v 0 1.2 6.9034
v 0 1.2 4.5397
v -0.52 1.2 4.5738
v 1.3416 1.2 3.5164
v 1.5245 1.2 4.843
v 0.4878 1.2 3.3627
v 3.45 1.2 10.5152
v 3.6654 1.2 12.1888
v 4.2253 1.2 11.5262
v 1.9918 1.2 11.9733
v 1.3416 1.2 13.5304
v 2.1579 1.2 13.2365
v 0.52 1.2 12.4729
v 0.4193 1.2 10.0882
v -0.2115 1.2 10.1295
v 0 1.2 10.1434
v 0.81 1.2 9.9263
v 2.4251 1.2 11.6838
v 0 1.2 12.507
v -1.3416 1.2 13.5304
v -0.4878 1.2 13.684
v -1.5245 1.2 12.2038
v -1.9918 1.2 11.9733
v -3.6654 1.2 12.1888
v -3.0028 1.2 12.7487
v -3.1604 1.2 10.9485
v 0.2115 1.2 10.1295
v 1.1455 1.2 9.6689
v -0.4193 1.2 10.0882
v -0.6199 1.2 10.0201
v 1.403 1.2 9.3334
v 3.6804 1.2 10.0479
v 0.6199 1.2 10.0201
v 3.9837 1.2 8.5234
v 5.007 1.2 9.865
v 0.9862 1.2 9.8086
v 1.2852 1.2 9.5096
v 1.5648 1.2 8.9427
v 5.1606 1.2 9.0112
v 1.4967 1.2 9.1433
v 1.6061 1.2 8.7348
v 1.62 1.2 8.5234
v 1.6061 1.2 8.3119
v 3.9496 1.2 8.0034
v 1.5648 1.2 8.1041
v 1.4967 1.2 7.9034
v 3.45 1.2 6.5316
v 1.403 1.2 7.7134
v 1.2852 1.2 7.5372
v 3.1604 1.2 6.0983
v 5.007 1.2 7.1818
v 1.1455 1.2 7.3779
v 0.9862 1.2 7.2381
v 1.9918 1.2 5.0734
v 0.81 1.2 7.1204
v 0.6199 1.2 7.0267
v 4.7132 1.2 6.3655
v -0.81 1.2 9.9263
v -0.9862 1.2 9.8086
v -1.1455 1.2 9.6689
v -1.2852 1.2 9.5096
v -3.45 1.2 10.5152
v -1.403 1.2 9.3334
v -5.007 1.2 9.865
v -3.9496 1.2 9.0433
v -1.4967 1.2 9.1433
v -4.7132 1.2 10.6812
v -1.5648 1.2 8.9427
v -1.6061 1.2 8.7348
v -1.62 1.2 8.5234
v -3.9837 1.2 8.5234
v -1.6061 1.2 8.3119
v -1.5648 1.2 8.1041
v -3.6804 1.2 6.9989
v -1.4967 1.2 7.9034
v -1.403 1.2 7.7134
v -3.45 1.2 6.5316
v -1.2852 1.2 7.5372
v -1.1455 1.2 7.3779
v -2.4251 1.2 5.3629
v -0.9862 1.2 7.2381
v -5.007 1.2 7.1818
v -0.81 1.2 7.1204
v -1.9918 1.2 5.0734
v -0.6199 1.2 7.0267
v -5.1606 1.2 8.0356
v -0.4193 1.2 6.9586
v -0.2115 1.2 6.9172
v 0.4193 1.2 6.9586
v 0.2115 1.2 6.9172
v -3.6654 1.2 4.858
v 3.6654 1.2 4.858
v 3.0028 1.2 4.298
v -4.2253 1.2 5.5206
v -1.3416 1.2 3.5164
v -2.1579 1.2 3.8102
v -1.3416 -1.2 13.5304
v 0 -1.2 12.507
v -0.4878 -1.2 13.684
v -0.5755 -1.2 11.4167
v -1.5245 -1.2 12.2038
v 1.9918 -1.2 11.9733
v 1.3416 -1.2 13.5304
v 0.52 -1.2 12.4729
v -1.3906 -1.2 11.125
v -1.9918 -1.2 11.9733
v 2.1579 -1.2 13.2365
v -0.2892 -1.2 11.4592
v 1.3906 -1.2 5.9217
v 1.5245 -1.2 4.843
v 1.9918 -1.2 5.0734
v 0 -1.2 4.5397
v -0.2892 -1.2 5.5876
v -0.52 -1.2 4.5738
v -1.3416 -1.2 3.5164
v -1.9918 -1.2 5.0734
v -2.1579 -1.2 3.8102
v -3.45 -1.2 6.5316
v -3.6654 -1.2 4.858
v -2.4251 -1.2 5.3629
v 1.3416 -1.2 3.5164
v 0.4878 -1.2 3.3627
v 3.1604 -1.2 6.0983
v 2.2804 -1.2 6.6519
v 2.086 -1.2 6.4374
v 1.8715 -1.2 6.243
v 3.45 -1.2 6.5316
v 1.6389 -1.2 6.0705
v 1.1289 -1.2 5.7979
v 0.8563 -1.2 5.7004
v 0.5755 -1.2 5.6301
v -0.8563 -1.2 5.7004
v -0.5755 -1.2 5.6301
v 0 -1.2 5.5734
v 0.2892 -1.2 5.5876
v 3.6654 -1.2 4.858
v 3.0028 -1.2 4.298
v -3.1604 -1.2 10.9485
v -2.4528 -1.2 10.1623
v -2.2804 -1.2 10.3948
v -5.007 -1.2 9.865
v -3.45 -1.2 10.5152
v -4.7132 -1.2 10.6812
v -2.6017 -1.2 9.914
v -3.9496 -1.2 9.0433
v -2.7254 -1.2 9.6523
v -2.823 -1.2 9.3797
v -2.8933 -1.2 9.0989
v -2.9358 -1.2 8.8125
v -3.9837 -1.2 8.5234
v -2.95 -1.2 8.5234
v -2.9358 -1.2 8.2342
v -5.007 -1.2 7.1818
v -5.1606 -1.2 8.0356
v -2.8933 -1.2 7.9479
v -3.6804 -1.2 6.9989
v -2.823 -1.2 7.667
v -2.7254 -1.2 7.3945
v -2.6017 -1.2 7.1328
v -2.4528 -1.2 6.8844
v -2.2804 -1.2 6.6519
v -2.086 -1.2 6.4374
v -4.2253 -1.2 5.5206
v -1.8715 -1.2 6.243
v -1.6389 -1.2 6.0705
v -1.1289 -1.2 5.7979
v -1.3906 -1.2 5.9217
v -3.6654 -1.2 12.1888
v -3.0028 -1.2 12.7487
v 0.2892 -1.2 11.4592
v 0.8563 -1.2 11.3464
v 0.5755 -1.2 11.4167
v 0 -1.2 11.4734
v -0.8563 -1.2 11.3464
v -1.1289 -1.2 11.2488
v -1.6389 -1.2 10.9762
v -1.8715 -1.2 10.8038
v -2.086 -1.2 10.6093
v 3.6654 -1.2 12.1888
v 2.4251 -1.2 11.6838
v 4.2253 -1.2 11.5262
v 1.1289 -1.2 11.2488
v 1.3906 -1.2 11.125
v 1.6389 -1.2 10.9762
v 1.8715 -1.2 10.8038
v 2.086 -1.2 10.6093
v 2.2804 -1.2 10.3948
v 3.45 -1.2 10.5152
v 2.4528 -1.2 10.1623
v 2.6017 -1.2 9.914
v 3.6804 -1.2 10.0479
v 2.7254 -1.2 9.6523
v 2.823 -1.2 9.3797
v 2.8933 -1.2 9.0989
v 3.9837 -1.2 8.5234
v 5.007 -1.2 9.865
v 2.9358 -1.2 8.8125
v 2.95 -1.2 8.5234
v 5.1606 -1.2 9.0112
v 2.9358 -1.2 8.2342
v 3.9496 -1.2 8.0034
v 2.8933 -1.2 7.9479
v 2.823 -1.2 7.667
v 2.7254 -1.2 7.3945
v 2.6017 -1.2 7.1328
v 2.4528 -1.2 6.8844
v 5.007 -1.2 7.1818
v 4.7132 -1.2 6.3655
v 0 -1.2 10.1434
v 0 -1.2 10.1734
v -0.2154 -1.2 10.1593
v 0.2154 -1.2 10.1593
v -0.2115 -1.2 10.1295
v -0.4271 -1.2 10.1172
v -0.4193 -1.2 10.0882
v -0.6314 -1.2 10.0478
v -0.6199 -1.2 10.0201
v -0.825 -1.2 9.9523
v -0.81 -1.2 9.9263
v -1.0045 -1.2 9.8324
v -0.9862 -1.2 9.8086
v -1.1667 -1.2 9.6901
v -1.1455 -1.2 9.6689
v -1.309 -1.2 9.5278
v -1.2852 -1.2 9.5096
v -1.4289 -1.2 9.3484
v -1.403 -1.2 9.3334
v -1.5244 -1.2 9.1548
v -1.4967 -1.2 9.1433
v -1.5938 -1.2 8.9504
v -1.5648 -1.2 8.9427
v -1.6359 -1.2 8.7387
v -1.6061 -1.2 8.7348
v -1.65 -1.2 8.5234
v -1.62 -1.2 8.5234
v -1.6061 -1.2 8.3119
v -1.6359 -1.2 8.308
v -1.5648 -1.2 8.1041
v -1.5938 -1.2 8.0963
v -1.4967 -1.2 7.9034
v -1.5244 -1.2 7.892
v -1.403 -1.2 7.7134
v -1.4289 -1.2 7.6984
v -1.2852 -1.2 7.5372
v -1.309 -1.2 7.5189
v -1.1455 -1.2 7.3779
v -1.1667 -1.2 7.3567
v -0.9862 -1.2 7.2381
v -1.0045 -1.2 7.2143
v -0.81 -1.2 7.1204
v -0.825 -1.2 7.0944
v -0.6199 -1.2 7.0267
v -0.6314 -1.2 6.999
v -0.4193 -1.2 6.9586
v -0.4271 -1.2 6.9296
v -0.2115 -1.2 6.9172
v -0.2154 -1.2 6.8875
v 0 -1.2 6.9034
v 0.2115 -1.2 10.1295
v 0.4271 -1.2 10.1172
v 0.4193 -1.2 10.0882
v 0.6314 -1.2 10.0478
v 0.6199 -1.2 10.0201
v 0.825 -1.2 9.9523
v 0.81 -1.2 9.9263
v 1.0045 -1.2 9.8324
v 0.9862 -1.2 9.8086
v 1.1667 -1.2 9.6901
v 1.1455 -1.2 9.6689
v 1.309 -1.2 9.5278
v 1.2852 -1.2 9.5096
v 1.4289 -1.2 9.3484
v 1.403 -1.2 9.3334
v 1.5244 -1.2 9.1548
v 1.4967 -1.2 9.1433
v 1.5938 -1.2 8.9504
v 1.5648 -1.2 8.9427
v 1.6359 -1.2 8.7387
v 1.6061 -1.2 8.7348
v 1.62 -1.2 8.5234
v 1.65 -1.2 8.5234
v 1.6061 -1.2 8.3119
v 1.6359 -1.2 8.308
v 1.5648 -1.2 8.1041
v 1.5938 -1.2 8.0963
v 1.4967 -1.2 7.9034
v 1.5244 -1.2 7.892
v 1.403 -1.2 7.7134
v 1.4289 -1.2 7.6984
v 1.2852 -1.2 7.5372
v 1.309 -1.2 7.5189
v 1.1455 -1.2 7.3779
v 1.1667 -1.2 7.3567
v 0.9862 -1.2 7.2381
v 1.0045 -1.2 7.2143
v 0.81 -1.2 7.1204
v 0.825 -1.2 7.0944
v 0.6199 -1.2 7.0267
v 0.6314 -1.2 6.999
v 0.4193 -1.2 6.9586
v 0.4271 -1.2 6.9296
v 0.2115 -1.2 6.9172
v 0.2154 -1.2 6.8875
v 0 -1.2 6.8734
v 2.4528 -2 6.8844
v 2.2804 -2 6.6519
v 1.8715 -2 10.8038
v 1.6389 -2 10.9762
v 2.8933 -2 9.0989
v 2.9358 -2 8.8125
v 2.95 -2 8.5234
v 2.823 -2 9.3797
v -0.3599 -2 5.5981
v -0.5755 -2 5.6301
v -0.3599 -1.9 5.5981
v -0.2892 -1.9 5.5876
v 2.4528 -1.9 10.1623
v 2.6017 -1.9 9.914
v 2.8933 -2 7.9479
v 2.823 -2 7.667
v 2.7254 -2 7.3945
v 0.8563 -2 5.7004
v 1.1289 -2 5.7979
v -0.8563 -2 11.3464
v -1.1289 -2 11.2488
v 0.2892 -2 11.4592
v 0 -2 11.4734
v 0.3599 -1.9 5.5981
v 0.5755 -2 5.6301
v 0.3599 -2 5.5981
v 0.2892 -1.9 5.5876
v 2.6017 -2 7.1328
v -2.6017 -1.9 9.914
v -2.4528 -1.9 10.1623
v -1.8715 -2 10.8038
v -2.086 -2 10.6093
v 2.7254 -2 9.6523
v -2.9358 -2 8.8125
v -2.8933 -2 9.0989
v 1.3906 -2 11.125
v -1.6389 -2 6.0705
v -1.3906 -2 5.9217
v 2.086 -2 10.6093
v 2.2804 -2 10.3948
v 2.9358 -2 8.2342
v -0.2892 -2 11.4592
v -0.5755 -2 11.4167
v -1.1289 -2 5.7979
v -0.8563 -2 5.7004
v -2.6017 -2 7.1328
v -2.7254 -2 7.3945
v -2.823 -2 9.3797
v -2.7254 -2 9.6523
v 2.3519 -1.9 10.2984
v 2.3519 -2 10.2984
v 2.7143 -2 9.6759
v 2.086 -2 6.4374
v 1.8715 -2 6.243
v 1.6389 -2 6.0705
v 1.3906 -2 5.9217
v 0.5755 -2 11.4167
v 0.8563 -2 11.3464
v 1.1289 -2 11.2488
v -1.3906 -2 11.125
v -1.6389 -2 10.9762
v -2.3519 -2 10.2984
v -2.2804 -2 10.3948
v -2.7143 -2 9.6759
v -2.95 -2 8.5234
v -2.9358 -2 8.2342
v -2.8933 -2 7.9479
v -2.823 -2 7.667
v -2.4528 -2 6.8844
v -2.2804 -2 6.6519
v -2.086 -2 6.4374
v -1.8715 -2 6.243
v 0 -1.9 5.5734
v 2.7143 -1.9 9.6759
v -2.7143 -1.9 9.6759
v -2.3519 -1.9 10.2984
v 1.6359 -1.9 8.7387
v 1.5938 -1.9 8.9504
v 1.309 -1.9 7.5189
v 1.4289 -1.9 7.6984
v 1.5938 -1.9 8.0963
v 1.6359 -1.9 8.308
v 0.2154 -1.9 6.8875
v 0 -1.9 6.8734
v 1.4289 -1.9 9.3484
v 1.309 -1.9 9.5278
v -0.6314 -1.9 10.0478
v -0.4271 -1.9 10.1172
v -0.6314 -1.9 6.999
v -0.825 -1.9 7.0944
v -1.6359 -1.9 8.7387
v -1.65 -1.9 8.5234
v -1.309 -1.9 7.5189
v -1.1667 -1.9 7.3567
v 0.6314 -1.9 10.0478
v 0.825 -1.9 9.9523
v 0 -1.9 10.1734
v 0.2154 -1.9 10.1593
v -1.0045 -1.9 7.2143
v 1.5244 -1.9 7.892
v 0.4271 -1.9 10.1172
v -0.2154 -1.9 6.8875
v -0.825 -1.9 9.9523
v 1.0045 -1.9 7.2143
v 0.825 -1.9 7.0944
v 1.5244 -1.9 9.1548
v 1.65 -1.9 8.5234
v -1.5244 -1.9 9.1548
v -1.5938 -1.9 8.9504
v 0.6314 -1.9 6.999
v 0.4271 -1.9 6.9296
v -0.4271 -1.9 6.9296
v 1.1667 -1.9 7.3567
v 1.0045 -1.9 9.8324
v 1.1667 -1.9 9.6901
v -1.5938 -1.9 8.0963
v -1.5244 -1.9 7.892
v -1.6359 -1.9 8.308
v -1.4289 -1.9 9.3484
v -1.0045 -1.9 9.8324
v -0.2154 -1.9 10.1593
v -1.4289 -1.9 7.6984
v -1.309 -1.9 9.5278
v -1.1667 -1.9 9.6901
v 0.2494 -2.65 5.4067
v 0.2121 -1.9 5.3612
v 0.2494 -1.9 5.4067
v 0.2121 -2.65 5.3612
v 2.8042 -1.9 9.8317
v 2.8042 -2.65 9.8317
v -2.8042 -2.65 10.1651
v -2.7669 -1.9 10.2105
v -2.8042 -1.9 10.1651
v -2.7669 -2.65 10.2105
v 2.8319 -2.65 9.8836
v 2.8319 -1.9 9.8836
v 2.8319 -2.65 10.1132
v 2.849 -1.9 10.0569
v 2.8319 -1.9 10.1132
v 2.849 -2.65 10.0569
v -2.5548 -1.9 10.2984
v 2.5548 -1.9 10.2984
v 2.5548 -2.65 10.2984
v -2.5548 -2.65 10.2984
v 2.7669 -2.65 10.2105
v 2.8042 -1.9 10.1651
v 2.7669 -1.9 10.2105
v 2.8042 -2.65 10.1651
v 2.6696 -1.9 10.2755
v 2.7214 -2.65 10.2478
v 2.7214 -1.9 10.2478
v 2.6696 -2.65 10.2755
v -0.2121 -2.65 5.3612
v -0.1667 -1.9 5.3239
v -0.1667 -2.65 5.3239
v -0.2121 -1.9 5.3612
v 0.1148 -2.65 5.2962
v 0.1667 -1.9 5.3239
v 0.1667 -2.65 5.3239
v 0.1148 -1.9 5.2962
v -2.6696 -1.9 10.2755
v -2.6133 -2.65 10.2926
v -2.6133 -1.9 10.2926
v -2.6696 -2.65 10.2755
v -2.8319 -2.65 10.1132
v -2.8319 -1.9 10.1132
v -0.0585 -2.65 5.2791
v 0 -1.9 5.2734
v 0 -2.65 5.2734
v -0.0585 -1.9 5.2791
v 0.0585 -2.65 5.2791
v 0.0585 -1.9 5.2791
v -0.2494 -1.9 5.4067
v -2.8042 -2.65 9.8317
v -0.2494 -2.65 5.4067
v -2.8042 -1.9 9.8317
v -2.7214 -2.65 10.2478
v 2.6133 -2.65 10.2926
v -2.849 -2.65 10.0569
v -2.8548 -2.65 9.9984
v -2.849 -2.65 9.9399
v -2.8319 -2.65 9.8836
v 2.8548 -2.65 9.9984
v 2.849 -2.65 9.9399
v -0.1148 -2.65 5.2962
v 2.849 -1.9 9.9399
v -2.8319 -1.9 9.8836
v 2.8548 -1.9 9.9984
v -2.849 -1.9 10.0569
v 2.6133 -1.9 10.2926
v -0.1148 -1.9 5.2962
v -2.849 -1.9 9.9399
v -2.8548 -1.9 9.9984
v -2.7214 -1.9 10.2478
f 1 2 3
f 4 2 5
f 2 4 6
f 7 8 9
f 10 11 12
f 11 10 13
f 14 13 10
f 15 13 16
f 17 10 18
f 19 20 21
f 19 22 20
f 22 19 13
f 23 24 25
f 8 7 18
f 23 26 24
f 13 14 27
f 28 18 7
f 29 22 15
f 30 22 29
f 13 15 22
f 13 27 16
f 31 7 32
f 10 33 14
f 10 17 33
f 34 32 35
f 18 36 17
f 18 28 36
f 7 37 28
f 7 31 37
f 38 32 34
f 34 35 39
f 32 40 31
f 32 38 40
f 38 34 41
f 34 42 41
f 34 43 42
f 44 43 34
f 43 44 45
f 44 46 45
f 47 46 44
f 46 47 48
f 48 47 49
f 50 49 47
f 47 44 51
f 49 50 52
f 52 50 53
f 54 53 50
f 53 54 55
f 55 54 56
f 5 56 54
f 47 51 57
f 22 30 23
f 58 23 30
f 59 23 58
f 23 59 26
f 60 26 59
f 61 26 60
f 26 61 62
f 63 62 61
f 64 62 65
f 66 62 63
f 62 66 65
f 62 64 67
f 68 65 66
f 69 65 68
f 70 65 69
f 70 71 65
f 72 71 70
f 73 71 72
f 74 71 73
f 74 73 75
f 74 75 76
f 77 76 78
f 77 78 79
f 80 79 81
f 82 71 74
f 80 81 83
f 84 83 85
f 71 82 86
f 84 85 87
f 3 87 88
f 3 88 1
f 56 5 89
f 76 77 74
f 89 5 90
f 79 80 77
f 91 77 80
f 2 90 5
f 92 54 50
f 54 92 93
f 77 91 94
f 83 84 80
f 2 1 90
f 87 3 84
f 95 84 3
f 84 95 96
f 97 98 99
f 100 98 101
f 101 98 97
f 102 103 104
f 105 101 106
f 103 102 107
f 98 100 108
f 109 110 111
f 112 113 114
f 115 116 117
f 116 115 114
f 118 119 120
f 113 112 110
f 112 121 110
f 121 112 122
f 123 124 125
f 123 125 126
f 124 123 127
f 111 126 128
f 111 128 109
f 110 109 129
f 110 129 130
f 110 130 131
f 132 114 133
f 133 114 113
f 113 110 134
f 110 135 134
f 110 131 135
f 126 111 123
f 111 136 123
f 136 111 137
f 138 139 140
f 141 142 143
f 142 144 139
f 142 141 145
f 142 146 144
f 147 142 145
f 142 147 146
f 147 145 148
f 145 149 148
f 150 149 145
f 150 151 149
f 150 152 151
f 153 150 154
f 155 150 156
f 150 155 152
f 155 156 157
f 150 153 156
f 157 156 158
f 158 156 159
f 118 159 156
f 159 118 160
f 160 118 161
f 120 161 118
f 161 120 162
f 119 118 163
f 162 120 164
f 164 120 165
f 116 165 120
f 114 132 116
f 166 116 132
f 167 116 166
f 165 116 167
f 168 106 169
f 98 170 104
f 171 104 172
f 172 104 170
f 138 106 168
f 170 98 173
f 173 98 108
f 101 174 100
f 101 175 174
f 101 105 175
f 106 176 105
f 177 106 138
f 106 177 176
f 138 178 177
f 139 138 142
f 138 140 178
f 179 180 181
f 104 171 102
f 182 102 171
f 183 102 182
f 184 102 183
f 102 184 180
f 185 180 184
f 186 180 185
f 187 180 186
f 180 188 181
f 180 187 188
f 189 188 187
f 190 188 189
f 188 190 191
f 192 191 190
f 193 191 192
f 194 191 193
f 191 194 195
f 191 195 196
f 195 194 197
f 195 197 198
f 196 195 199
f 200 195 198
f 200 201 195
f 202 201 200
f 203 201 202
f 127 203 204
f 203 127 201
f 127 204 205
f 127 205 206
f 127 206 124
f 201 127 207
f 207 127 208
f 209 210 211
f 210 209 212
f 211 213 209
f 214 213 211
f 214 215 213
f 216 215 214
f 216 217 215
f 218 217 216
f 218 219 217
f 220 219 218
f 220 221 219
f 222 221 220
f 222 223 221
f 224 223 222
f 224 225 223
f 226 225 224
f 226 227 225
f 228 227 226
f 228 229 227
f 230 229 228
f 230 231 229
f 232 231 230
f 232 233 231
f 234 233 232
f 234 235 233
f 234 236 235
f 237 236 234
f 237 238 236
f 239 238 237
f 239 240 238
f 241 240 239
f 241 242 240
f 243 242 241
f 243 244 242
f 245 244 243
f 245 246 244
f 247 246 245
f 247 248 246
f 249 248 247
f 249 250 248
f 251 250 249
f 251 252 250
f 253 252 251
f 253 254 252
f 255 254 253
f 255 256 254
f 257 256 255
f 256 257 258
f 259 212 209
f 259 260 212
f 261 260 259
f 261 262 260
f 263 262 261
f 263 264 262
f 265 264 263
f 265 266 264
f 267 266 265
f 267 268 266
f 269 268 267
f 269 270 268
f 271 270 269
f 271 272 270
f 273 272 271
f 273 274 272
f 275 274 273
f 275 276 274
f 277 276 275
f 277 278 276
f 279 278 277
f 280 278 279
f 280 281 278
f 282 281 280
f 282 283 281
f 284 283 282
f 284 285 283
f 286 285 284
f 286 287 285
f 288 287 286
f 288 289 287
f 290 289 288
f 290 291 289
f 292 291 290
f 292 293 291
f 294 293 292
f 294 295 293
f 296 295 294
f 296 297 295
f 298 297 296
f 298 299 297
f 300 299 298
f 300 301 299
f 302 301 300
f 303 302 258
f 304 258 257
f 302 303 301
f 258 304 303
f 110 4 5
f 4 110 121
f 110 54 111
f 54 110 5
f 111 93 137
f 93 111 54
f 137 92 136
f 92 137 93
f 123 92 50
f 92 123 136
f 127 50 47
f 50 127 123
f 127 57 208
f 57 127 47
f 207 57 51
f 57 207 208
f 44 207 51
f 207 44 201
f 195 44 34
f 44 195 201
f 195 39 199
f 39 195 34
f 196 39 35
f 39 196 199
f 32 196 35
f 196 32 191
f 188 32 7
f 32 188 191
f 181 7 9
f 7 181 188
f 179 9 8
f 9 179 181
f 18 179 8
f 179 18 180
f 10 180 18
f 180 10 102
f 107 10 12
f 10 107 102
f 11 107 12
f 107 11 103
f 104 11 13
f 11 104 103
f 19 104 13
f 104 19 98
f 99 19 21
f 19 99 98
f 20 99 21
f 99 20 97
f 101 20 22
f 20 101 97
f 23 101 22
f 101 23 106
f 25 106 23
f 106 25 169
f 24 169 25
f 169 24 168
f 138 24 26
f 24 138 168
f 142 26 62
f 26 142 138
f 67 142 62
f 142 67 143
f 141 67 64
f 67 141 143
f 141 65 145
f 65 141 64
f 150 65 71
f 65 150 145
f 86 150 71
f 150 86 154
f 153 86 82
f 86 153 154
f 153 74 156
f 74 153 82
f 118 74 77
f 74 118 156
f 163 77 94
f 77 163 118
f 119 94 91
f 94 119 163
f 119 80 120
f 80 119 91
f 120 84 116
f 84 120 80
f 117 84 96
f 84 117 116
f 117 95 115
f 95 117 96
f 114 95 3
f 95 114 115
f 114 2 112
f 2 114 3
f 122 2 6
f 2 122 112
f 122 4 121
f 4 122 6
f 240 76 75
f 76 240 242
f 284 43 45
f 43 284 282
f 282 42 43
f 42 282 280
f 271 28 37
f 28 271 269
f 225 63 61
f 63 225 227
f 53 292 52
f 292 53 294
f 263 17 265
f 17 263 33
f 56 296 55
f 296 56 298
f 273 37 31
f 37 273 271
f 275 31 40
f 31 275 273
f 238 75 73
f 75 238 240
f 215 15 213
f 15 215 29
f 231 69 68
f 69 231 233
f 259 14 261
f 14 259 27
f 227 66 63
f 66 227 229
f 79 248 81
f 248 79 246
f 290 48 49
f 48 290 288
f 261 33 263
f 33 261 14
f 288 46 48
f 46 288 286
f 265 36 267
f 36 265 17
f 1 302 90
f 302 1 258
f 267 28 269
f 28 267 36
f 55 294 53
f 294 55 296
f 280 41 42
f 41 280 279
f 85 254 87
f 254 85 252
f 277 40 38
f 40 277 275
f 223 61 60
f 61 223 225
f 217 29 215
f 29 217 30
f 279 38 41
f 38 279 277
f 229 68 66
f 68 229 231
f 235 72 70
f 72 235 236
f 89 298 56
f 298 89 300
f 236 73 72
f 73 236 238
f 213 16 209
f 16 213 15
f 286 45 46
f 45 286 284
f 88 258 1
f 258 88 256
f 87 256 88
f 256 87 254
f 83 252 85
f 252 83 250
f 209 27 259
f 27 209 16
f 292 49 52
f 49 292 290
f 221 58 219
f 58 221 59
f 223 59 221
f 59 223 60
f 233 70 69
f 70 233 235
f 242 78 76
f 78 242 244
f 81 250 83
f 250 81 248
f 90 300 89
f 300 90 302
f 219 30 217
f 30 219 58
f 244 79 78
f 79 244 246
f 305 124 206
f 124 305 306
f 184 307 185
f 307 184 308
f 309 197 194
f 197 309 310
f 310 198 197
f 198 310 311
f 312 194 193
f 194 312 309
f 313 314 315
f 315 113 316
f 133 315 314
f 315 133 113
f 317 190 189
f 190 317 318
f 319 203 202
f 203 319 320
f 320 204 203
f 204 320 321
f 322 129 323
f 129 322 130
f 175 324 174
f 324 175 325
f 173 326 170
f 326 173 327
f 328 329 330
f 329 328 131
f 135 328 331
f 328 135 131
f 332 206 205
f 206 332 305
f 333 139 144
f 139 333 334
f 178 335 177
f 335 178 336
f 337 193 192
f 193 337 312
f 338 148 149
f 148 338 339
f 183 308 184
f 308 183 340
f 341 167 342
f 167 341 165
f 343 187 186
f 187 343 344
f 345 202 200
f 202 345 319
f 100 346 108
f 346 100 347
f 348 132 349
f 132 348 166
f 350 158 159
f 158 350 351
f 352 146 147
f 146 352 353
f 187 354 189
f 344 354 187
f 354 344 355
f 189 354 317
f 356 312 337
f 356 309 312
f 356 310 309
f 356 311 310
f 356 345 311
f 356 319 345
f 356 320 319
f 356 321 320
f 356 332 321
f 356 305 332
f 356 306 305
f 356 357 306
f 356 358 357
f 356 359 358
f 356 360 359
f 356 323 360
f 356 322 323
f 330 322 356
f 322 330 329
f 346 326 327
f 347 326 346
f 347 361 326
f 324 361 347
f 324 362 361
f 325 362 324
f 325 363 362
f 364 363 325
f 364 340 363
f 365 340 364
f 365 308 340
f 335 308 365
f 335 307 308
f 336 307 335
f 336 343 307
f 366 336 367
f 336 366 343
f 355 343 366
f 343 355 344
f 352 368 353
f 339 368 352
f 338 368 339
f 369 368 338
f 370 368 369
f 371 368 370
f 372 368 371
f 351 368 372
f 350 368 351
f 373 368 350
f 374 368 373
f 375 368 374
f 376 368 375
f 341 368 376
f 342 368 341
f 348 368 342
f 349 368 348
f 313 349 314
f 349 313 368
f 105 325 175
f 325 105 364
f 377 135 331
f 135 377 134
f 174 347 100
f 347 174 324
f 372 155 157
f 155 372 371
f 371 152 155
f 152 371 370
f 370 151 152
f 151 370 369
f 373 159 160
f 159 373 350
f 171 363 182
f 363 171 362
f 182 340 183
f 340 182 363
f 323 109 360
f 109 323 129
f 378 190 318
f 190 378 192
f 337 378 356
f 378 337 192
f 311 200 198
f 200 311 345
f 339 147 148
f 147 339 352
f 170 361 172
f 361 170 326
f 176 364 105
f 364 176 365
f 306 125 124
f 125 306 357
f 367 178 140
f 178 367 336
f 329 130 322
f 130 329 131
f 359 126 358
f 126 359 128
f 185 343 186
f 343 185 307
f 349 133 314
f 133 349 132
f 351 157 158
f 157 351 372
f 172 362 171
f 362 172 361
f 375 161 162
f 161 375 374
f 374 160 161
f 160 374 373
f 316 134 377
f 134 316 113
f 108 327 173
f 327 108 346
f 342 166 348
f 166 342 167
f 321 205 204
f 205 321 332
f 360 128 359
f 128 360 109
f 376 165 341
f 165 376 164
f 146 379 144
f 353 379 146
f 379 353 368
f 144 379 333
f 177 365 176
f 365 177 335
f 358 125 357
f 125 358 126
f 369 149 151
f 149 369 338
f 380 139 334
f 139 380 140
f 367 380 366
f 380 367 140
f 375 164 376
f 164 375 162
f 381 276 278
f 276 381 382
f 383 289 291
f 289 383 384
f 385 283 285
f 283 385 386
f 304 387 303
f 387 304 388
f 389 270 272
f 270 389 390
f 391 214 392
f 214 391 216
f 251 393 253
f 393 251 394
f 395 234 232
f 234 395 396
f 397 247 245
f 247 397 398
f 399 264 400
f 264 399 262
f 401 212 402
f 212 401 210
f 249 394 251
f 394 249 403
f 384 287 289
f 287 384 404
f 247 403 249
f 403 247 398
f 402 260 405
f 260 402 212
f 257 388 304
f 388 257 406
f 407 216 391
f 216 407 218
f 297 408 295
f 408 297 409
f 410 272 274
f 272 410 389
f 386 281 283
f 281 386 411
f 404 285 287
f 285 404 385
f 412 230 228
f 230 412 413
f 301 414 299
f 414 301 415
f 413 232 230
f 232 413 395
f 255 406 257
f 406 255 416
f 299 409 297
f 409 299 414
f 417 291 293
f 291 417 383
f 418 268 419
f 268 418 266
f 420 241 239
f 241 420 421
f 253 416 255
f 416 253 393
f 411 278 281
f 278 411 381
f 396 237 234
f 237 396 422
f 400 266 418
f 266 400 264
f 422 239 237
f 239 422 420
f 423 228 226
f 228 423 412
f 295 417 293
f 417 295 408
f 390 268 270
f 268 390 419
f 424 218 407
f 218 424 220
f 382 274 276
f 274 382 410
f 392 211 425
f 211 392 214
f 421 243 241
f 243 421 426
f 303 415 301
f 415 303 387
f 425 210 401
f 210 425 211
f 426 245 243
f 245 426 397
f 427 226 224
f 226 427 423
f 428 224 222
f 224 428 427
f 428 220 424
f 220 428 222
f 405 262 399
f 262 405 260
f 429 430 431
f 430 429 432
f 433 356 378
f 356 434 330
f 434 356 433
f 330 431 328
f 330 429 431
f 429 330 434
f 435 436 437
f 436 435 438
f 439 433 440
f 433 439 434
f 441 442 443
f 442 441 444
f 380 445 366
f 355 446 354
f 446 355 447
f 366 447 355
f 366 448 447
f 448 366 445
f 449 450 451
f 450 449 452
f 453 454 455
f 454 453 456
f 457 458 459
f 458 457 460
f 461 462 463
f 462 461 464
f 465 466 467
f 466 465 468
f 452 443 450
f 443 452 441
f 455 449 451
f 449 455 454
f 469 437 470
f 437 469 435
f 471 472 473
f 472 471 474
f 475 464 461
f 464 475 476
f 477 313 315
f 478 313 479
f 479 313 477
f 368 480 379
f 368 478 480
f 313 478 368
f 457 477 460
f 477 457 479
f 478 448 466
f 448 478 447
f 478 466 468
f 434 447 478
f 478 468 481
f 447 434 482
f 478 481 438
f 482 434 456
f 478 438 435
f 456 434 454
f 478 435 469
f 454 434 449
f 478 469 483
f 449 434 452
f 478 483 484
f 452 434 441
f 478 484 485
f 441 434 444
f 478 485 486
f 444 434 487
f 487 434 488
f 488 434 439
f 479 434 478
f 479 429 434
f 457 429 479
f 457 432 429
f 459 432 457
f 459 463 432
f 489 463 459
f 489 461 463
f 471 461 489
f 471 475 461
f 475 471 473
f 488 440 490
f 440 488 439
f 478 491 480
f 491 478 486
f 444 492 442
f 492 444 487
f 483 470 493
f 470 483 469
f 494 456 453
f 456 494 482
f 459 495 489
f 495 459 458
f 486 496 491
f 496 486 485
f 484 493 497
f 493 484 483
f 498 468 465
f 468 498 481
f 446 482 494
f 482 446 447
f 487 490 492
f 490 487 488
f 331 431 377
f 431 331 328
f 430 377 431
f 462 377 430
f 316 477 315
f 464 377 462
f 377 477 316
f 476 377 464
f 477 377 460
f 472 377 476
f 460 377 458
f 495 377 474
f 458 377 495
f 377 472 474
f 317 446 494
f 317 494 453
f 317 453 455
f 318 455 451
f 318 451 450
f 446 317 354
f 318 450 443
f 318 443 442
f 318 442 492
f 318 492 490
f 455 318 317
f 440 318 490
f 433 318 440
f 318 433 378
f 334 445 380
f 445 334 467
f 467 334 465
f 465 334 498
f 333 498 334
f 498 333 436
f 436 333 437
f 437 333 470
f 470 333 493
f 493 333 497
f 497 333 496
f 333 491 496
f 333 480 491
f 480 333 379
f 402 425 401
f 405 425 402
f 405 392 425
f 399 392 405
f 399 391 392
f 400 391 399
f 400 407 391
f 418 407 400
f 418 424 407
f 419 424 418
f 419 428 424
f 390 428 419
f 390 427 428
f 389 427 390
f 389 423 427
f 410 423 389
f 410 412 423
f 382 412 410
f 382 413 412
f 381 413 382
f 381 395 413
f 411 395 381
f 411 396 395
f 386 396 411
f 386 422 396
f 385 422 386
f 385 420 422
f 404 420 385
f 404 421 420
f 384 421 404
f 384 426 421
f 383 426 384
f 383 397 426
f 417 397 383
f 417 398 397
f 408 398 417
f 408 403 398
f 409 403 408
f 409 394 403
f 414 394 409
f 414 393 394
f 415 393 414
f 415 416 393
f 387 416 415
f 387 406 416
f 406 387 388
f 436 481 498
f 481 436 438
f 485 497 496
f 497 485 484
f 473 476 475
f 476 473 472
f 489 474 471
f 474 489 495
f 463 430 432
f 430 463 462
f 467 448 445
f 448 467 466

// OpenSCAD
// CH1 03C 花键轴 Z+ 侧小齿轮 + Y− 侧狗牙
//
// Mechanical contract
// process: FDM fit prototype; PLA/PETG first article, resin only for fit checks
// material: printed compound candidate; no metal load rating is assumed
// parting_plane: n/a (single annular compound part)
// opening_direction: n/a
// fastener: a nominal Ø3 mm round shaft passes through the Y-axis gear/dog bore
// seal: n/a
// print_orientation: lay the Y axis down only after slicer review; the thumbnail
//   keeps the real assembly direction visible instead of baking in a print pose
// units: mm
// axis: gear and dog are both coaxial with world Y; profile is in world XZ
// placement: gear center is on the Z+ side of the long spline shaft
//
// This file models the literal arrangement: a small gear at Z+ and a rounded-
// triangle dog interface protruding directly below it along Y−.

//#region 导入/依赖
include <parts/ch1_03c_spline_gear_dog_params.scad>
//#endregion

//#region 常量/配置
$fa = 5;
$fs = 0.18;
//#endregion

//#region 模型/类型
// solid     printable gear + lower rounded-triangle dog interface
// thumbnail same part plus the matching lower receiver and a short translucent
// spline-shaft context at Z=0
//#endregion

//#region 私有成员：轮廓与轴向拉伸
module spline_profile_2d(teeth, root_r, tip_r) {
    polygon(spline_gear_points(teeth, root_r, tip_r));
}

module y_profile_extrude(points, center_x, center_y, center_z, thickness) {
    // Local +Z maps to world −Y; the translated interval is centered at center_y.
    translate([center_x, center_y + thickness / 2, center_z])
        rotate([90, 0, 0])
            linear_extrude(
                height = thickness,
                convexity = 8
            )
                polygon(points);
}

module y_bore(center_x, center_y, center_z, diameter, thickness) {
    // Local +Z maps to world +Y, starting just below the lower face.
    translate([
        center_x,
        center_y - thickness / 2 - SPLINE_GEAR_EPS,
        center_z
    ])
        rotate([-90, 0, 0])
            cylinder(
                d = diameter,
                h = thickness + 2 * SPLINE_GEAR_EPS,
                $fn = 48
            );
}

module y_cylinder_at(center_x, center_z, center_y, radius, height, sides = 32) {
    // A Y-axis cylinder whose center is at center_y; its +Z local direction
    // points toward world Y− so the interface grows downward from the base.
    translate([center_x, center_y + height / 2, center_z])
        rotate([90, 0, 0])
            cylinder(r = radius, h = height, $fn = sides);
}

module rounded_triangle_prism(center_y, height, extra_radius = 0) {
    // Convex hull of three round-ended lobes: a printable rounded triangle.
    hull() {
        for (i = [0:2]) {
            angle = SPLINE_DOG_TRI_ROTATION_DEG + i * 120;
            y_cylinder_at(
                SPLINE_GEAR_CENTER_X
                    + SPLINE_DOG_TRI_VERTEX_R * cos(angle),
                SPLINE_GEAR_CENTER_Z
                    + SPLINE_DOG_TRI_VERTEX_R * sin(angle),
                center_y,
                SPLINE_DOG_TRI_HEAD_R + extra_radius,
                height
            );
        }
    }
}

module rounded_claw_volume(
    index,
    center_y,
    height,
    extra_radius = 0
) {
    // Backup three-claw interface kept available through SPLINE_DOG_INTERFACE.
    angle = index * 360 / SPLINE_DOG_CLAW_COUNT;
    hull() {
        y_cylinder_at(
            SPLINE_GEAR_CENTER_X
                + SPLINE_DOG_CLAW_ROOT_CENTER_R * cos(angle),
            SPLINE_GEAR_CENTER_Z
                + SPLINE_DOG_CLAW_ROOT_CENTER_R * sin(angle),
            center_y,
            SPLINE_DOG_CLAW_HEAD_R + extra_radius,
            height
        );
        y_cylinder_at(
            SPLINE_GEAR_CENTER_X
                + SPLINE_DOG_CLAW_TIP_CENTER_R * cos(angle),
            SPLINE_GEAR_CENTER_Z
                + SPLINE_DOG_CLAW_TIP_CENTER_R * sin(angle),
            center_y,
            SPLINE_DOG_CLAW_HEAD_R + extra_radius,
            height
        );
    }
}

module dog_interface_volume(center_y, height, extra_radius = 0) {
    if (SPLINE_DOG_INTERFACE == "rounded_triangle") {
        rounded_triangle_prism(center_y, height, extra_radius);
    } else {
        for (i = [0:SPLINE_DOG_CLAW_COUNT - 1]) {
            rounded_claw_volume(i, center_y, height, extra_radius);
        }
    }
}
//#endregion

//#region 公开 API：打印件
module spline_side_gear() {
    gear_root_r = spline_gear_root_r(
        SPLINE_GEAR_TEETH,
        SPLINE_GEAR_PITCH_MM,
        SPLINE_GEAR_TOOTH_DEPTH
    );
    gear_tip_r = spline_gear_tip_r(
        SPLINE_GEAR_TEETH,
        SPLINE_GEAR_PITCH_MM,
        SPLINE_GEAR_TOOTH_DEPTH
    );
    difference() {
        y_profile_extrude(
            spline_gear_points(
                SPLINE_GEAR_TEETH,
                gear_root_r,
                gear_tip_r
            ),
            SPLINE_GEAR_CENTER_X,
            SPLINE_GEAR_CENTER_Y,
            SPLINE_GEAR_CENTER_Z,
            SPLINE_GEAR_T
        );
        y_bore(
            SPLINE_GEAR_CENTER_X,
            SPLINE_GEAR_CENTER_Y,
            SPLINE_GEAR_CENTER_Z,
            SPLINE_GEAR_BORE_D,
            SPLINE_GEAR_T
        );
    }
}

module dog_base_ring() {
    difference() {
        translate([
            SPLINE_GEAR_CENTER_X,
            SPLINE_DOG_BASE_CENTER_Y + SPLINE_DOG_BASE_T / 2,
            SPLINE_GEAR_CENTER_Z,
        ])
            rotate([90, 0, 0])
                cylinder(
                    r = SPLINE_DOG_BASE_R,
                    h = SPLINE_DOG_BASE_T,
                    $fn = 64
                );
        y_bore(
            SPLINE_GEAR_CENTER_X,
            SPLINE_DOG_BASE_CENTER_Y,
            SPLINE_GEAR_CENTER_Z,
            SPLINE_DOG_BORE_D,
            SPLINE_DOG_BASE_T
        );
    }
}

module lower_dog_ring() {
    union() {
        dog_base_ring();
        dog_interface_volume(
            SPLINE_DOG_INTERFACE_CENTER_Y,
            SPLINE_DOG_INTERFACE_H_Y
        );
    }
}

module dog_mate_receiver() {
    pocket_height = SPLINE_DOG_MATE_POCKET_DEPTH
        + 2 * SPLINE_GEAR_EPS;
    pocket_top_y = SPLINE_DOG_MATE_CENTER_Y
        + SPLINE_DOG_MATE_T / 2
        + SPLINE_GEAR_EPS;
    pocket_center_y = pocket_top_y - pocket_height / 2;
    difference() {
        translate([
            SPLINE_GEAR_CENTER_X,
            SPLINE_DOG_MATE_CENTER_Y + SPLINE_DOG_MATE_T / 2,
            SPLINE_GEAR_CENTER_Z
        ])
            rotate([90, 0, 0])
                cylinder(
                    r = SPLINE_DOG_MATE_R,
                    h = SPLINE_DOG_MATE_T,
                    $fn = 64
                );
        y_bore(
            SPLINE_GEAR_CENTER_X,
            SPLINE_DOG_MATE_CENTER_Y,
            SPLINE_GEAR_CENTER_Z,
            SPLINE_DOG_MATE_BORE_D,
            SPLINE_DOG_MATE_T
        );
        dog_interface_volume(
            pocket_center_y,
            pocket_height,
            SPLINE_DOG_MATE_POCKET_CLEARANCE
        );
    }
}

module spline_gear_dog_solid() {
    // Positive axial overlap joins the annular base and the interface while
    // retaining the through bore. The rounded-triangle face is on Y−.
    union() {
        spline_side_gear();
        lower_dog_ring();
    }
}
//#endregion

//#region 公开 API：缩略图背景
module spline_shaft_thumbnail_context() {
    shaft_root_r = spline_gear_root_r(
        SPLINE_TEETH,
        SPLINE_PITCH_MM,
        SPLINE_TOOTH_DEPTH
    );
    shaft_tip_r = spline_gear_tip_r(
        SPLINE_TEETH,
        SPLINE_PITCH_MM,
        SPLINE_TOOTH_DEPTH
    );
    // Only a short section is shown; the actual shaft remains the separate
    // 159 mm long part. Its center is at X=0, Z=0, so the candidate is visibly
    // placed on the Z+ side by SPLINE_GEAR_CENTER_Z.
    color("#6c7a86", 0.24)
        y_profile_extrude(
            spline_gear_points(SPLINE_TEETH, shaft_root_r, shaft_tip_r),
            0,
            0,
            0,
            36
        );
}

module spline_gear_dog_thumbnail() {
    spline_shaft_thumbnail_context();
    color("#e2a84b")
        spline_side_gear();
    color("#5d7885")
        lower_dog_ring();
    color("#8b9298", 0.65)
        dog_mate_receiver();
}
//#endregion

//#region 业务逻辑
if (SPLINE_GEAR_DOG_MODEL == "solid") {
    spline_gear_dog_solid();
} else if (SPLINE_GEAR_DOG_MODEL == "thumbnail") {
    spline_gear_dog_thumbnail();
} else {
    assert(false, str("unknown SPLINE_GEAR_DOG_MODEL: ", SPLINE_GEAR_DOG_MODEL));
}

echo(
    "spline_gear_dog",
    "model",
    SPLINE_GEAR_DOG_MODEL,
    "axis",
    "Y",
    "profile_plane",
    "XZ",
    "gear_teeth",
    SPLINE_GEAR_TEETH,
    "gear_pitch_mm",
    SPLINE_GEAR_PITCH_MM,
    "gear_outer_d_mm",
    spline_gear_outer_d(),
    "gear_t_mm",
    SPLINE_GEAR_T,
    "gear_bore_d_mm",
    SPLINE_GEAR_BORE_D,
    "gear_center_z_mm",
    spline_gear_center_distance(),
    "dog_interface",
    SPLINE_DOG_INTERFACE,
    "dog_claw_count_backup",
    SPLINE_DOG_CLAW_COUNT,
    "dog_interface_outer_d_mm",
    2 * spline_gear_dog_interface_outer_r(),
    "dog_base_outer_d_mm",
    2 * SPLINE_DOG_BASE_R,
    "dog_interface_h_y_mm",
    SPLINE_DOG_INTERFACE_H_Y,
    "dog_t_mm",
    SPLINE_DOG_T,
    "dog_center_y_mm",
    SPLINE_DOG_INTERFACE_CENTER_Y,
    "dog_bore_d_mm",
    SPLINE_DOG_BORE_D,
    "dog_spline_clearance_mm",
    spline_gear_dog_spline_clearance(),
    "mate_outer_d_mm",
    2 * SPLINE_DOG_MATE_R,
    "radial_envelope_outer_d_mm",
    2 * SPLINE_DOG_RADIAL_ENVELOPE_R,
    "mate_spline_clearance_mm",
    spline_gear_dog_mate_spline_clearance(),
    "mate_pocket_clearance_mm",
    SPLINE_DOG_MATE_POCKET_CLEARANCE
);
//#endregion

//#region 方法/工具
// 导出 solid：-D 'SPLINE_GEAR_DOG_MODEL="solid"'
// 预览 thumbnail：-D 'SPLINE_GEAR_DOG_MODEL="thumbnail"'
//#endregion
